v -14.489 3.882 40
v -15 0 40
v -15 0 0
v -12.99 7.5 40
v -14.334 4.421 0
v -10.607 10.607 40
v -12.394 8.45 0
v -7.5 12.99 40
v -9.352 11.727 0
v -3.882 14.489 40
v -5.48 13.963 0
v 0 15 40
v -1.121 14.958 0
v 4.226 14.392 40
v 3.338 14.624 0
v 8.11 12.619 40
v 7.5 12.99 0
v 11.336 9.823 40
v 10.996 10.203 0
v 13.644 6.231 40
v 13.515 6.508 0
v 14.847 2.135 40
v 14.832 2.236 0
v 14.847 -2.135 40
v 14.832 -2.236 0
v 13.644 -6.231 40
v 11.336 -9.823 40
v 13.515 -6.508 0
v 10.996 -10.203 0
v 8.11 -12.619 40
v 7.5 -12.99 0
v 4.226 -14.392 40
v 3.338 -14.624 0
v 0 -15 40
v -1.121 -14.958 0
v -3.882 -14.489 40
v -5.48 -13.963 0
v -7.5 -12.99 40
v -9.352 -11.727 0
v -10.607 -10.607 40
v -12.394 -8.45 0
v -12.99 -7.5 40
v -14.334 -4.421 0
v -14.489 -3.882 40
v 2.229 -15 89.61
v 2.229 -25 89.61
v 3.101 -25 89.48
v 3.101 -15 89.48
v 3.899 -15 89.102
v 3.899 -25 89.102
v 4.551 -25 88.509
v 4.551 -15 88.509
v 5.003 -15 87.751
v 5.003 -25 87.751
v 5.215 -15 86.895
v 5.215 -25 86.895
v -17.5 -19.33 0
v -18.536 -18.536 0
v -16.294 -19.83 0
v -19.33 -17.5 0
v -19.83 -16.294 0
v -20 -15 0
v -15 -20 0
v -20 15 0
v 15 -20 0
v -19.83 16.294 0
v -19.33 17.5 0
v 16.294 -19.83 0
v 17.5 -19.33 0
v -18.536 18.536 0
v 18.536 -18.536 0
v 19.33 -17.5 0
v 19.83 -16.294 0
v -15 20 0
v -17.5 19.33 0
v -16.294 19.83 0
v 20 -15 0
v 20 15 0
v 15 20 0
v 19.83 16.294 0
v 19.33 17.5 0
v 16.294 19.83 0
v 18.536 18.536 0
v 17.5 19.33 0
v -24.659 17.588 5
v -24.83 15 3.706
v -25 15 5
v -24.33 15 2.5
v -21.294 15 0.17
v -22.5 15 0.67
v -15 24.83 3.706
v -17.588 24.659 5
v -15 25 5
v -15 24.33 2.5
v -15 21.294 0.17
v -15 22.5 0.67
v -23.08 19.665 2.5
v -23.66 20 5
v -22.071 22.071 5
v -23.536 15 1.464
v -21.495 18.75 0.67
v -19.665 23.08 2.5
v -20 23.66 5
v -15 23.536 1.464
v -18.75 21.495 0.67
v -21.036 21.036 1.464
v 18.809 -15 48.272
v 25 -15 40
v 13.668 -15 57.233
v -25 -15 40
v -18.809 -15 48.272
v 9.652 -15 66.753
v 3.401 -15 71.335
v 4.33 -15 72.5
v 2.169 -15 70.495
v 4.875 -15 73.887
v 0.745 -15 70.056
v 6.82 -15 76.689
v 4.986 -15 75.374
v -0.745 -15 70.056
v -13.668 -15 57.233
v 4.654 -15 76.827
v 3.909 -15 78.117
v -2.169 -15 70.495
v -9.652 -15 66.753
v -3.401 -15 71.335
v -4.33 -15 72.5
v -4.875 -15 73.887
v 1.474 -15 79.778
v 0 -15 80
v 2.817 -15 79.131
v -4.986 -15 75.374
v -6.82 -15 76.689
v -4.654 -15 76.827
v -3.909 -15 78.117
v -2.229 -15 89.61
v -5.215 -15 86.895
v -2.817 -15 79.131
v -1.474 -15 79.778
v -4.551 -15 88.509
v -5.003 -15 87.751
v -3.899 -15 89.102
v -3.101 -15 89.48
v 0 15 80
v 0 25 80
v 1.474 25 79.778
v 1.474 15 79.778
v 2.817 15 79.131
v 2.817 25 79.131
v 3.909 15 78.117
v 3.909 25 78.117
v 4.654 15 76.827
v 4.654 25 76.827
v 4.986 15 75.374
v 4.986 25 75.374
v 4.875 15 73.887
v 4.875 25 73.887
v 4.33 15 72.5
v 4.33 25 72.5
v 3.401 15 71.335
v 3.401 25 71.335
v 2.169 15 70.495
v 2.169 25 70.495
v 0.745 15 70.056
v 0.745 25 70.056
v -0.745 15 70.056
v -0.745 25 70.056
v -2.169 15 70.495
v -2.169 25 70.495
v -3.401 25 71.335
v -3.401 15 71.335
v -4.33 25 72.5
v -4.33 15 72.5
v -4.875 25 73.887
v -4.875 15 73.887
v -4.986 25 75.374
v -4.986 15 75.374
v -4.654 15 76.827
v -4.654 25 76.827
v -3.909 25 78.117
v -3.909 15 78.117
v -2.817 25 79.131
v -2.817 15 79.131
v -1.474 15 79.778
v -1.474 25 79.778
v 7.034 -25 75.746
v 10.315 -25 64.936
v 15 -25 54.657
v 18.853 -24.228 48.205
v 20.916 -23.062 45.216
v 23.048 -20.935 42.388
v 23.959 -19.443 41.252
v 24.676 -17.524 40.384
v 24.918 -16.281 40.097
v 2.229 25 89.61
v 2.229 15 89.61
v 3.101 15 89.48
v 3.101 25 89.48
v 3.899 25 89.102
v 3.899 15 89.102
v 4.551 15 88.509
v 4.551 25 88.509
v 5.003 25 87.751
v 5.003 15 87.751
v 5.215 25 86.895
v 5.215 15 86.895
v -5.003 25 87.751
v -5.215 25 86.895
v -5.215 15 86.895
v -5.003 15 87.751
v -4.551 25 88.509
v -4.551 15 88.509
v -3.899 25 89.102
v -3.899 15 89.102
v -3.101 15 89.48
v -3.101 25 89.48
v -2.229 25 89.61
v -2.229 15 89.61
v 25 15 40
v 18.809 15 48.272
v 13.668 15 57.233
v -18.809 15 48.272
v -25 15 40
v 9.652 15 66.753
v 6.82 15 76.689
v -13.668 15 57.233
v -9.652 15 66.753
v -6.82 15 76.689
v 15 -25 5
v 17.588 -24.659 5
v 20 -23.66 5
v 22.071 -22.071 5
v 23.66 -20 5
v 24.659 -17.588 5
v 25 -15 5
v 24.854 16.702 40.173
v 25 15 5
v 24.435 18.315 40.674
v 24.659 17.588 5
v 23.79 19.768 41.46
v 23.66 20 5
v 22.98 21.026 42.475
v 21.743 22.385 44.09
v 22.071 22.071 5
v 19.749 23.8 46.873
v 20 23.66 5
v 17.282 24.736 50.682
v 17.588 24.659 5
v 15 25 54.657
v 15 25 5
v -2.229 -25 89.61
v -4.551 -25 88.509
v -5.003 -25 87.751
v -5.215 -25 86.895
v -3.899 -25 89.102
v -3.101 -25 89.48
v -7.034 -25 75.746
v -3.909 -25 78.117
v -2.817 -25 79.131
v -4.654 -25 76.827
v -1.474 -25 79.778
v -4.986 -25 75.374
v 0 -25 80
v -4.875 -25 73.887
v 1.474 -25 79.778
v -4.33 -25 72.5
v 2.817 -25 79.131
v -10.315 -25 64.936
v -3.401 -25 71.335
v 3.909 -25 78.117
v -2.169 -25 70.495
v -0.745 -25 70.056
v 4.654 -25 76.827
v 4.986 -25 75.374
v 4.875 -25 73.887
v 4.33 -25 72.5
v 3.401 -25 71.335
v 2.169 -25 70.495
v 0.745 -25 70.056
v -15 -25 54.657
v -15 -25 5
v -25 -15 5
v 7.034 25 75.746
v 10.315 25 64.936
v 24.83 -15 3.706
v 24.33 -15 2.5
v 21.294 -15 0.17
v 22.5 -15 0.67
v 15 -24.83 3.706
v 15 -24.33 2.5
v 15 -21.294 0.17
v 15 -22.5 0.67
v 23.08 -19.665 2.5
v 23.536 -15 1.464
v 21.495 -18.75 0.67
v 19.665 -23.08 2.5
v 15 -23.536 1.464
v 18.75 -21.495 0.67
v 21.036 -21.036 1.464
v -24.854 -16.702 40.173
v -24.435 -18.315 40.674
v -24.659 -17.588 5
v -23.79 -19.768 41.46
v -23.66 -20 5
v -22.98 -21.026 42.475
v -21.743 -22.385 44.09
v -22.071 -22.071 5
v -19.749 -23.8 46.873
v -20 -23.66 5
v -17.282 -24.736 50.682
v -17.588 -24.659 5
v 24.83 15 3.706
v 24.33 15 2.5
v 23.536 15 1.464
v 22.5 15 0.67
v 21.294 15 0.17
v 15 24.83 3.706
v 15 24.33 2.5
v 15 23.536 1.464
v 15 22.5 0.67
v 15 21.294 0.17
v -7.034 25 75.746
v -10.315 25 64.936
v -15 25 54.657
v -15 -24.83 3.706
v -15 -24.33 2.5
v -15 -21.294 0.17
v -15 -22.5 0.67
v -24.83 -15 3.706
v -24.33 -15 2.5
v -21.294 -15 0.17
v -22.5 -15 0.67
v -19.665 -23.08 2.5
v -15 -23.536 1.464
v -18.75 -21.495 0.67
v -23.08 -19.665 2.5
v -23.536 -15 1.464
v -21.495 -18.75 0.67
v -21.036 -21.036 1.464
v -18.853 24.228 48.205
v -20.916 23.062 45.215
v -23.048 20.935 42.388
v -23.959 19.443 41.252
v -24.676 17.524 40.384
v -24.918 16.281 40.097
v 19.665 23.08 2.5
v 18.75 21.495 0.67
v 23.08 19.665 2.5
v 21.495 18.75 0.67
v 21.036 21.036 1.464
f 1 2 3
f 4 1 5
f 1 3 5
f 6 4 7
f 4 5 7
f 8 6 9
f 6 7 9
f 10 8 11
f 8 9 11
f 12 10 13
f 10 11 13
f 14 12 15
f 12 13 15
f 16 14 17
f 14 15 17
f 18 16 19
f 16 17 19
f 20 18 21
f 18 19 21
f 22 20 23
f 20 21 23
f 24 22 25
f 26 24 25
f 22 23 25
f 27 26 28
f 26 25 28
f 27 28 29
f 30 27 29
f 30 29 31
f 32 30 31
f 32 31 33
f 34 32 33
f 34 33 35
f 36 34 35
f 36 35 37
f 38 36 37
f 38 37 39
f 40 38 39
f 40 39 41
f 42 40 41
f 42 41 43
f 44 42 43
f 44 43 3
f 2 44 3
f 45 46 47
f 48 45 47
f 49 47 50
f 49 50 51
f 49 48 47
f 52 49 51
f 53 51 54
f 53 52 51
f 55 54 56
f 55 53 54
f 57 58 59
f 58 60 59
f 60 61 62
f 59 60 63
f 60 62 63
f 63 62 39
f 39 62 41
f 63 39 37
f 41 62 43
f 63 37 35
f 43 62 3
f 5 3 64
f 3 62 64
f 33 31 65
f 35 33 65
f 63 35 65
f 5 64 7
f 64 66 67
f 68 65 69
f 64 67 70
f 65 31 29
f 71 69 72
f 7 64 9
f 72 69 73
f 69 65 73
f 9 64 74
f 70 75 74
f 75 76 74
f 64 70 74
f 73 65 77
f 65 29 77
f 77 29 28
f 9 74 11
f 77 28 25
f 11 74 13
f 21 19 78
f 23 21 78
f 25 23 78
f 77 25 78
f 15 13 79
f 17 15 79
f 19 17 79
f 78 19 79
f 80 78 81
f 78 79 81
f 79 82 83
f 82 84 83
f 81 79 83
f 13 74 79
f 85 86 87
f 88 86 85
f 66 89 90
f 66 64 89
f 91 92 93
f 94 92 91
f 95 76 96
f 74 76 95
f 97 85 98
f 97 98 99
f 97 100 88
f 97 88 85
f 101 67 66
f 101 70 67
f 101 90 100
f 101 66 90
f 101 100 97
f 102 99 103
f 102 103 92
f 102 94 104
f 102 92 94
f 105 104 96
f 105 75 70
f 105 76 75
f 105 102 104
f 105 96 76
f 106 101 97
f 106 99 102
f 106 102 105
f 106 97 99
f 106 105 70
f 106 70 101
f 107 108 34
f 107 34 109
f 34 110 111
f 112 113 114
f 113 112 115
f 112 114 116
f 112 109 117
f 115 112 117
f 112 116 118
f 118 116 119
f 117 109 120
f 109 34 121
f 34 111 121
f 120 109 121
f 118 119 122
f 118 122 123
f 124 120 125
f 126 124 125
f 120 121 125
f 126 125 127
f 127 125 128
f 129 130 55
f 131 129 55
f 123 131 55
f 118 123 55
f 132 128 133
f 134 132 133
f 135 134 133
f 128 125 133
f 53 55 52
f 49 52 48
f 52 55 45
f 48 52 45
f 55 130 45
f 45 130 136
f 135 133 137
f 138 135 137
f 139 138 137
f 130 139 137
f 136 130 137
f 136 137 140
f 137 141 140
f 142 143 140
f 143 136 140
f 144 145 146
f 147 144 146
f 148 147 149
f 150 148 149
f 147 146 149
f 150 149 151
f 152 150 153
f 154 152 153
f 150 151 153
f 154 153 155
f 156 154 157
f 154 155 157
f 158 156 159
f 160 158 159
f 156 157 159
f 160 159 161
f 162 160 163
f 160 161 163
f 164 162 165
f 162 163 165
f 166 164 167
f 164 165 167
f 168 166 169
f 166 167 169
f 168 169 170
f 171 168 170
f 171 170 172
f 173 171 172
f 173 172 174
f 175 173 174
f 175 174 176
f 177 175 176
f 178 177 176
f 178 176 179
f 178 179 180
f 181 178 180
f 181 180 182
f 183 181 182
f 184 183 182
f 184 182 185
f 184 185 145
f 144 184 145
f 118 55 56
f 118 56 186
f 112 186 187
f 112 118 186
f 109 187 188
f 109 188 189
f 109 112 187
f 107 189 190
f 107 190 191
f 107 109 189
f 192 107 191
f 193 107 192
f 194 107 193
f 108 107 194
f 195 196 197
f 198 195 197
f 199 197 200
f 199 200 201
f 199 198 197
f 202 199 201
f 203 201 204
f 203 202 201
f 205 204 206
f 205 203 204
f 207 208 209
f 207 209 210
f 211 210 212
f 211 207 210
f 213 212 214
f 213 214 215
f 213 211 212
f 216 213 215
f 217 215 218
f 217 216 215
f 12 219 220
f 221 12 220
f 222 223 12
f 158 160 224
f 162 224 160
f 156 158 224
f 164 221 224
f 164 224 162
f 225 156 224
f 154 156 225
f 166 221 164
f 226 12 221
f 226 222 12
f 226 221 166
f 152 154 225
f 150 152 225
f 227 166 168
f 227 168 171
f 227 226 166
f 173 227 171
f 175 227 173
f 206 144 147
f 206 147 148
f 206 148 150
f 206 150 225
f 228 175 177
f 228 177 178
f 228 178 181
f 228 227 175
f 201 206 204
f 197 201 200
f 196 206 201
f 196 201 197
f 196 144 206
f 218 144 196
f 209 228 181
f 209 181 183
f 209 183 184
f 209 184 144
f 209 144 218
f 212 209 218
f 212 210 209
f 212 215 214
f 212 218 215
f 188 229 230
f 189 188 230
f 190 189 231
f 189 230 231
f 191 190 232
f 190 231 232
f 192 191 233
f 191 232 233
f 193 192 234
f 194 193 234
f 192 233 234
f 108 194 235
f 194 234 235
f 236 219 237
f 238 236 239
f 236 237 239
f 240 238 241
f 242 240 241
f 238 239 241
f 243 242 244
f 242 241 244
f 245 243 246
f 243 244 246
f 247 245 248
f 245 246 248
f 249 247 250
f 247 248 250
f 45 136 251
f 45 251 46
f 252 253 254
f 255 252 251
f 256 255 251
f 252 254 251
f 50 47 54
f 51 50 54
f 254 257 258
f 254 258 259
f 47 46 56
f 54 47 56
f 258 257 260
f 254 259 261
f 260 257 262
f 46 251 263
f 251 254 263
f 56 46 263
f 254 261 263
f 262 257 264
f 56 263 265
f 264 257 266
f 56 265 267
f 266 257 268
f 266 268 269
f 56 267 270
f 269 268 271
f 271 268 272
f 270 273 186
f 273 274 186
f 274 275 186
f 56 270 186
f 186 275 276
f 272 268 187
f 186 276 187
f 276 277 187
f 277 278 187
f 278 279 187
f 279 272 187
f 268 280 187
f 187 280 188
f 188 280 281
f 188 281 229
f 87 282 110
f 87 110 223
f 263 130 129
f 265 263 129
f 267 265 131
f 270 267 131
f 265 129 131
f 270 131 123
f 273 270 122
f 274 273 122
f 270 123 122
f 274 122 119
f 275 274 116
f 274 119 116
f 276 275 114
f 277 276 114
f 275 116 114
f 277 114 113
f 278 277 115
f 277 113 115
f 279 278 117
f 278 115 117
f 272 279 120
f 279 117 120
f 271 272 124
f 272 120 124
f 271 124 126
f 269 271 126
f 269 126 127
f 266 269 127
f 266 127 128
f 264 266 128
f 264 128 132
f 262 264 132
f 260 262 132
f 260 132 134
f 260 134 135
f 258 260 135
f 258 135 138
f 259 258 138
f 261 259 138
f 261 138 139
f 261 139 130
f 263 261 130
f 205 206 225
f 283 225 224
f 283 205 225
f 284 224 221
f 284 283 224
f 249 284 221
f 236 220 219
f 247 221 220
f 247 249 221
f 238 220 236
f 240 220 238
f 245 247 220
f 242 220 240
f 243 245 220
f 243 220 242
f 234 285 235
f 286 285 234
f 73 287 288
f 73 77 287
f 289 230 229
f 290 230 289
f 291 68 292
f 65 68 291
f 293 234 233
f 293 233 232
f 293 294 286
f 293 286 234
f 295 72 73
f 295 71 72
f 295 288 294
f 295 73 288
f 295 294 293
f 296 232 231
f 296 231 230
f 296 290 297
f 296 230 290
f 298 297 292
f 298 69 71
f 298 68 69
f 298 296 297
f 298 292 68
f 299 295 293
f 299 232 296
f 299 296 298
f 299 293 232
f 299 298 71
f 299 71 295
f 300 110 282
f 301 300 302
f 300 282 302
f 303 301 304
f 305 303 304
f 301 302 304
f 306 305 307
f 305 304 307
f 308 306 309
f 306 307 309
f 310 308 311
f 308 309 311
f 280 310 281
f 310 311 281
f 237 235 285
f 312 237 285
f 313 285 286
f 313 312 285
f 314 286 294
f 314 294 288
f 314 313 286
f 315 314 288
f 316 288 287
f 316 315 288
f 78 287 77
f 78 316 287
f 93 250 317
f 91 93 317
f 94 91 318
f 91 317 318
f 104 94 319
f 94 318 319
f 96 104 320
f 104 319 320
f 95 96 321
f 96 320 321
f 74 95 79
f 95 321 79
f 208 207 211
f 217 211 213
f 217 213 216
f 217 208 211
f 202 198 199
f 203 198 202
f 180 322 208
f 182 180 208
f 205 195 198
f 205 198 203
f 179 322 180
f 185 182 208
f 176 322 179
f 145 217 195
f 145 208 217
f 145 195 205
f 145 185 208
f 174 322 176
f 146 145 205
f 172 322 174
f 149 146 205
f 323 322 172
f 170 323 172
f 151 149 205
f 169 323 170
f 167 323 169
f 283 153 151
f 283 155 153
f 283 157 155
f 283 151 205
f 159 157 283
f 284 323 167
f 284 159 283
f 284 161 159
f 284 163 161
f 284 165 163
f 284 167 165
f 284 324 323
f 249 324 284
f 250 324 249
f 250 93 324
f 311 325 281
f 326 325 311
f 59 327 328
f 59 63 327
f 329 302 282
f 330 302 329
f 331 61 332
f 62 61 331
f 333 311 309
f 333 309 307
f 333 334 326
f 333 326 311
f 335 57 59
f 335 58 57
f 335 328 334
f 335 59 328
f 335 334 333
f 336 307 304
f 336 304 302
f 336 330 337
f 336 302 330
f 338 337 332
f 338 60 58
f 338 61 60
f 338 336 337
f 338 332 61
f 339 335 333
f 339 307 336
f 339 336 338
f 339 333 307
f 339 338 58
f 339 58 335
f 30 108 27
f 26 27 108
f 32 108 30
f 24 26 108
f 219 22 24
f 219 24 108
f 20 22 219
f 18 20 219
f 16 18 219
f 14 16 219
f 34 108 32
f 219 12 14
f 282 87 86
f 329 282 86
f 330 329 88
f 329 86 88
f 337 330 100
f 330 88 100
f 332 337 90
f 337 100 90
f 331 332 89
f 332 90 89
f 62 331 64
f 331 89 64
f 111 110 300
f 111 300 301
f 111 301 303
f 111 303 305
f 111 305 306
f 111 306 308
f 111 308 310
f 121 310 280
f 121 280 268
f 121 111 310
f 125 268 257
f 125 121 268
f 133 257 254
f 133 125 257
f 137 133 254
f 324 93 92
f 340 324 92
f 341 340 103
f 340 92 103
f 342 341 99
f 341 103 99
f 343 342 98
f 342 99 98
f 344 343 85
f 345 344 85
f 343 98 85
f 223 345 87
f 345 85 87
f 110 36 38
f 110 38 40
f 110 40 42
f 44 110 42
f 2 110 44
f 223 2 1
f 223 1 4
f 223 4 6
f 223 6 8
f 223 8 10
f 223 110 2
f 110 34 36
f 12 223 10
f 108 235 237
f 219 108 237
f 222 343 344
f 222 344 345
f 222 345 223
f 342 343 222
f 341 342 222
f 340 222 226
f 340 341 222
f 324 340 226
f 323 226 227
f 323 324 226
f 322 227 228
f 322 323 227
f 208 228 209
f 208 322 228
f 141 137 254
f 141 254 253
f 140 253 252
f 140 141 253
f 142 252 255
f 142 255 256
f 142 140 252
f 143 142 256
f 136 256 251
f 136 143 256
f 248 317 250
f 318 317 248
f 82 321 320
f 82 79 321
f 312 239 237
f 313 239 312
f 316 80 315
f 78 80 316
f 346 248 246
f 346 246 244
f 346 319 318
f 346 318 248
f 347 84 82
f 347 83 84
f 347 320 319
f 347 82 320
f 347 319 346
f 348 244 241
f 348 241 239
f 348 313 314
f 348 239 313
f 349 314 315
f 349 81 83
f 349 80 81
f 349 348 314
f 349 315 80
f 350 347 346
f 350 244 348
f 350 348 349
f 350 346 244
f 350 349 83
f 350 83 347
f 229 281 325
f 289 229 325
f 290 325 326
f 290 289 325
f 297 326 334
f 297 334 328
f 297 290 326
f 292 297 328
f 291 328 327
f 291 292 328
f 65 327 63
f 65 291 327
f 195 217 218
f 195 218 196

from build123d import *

# Parameters (mm, degrees)
SKETCH1_W           = 50
SKETCH1_H           = 50
BOSS_EXTRUDE1_DEPTH = 89.61
SKETCH2_R           = 15
CUT_EXTRUDE1_DEPTH  = 97.332508013
SKETCH3_W           = 49.61
SKETCH3_H           = 30
CUT_EXTRUDE2_DEPTH  = 106.61700668
FILLET3_R           = 5
FILLET4_R           = 10
SKETCH4_R           = 5
CUT_EXTRUDE3_DEPTH  = 106.61700668


with BuildPart() as part:
    # Sketch1 → Boss-Extrude1 (new body)
    with BuildSketch(Plane.XY):
        Rectangle(SKETCH1_W, SKETCH1_H)
    extrude(amount=BOSS_EXTRUDE1_DEPTH)

    # Sketch2 → Cut-Extrude1 (cut, through all)
    with BuildSketch(Plane(origin=(0, 0, 0), x_dir=(-1, 0, 0), z_dir=(0, 0, -1))):
        Circle(SKETCH2_R)
    extrude(amount=-CUT_EXTRUDE1_DEPTH, mode=Mode.SUBTRACT)

    # Sketch3 → Cut-Extrude2 (cut, through all)
    with BuildSketch(Plane.ZY.offset(25)):
        with Locations((64.805, 0)):
            Rectangle(SKETCH3_W, SKETCH3_H)
    extrude(amount=-CUT_EXTRUDE2_DEPTH, mode=Mode.SUBTRACT)

    # Fillet3
    fillet3_edges = [part.edges().sort_by_distance(p)[0] for p in [
        (0, -25, 0),
        (-25, 0, 0),
        (0, 25, 0),
        (25, 0, 0),
    ]]
    fillet(fillet3_edges, radius=FILLET3_R)

    # Fillet4
    # the kernel refuses this fillet: 10 mm, written as the material it takes off along each edge
    with BuildSketch(Plane(origin=(-15, -15, 0), x_dir=(0, -1, 0), z_dir=(1, 0, 0))) as fillet4_piece_1:
        with BuildLine():
            CenterArc((5, -5), 5, 0, 90)
            Line((10, -5), (10, 0))
            Line((10, 0), (5, 0))
        make_face()
    revolve(axis=Axis((-15, -15, 0), (0, 0, -1)), revolution_arc=90, mode=Mode.SUBTRACT)
    with BuildSketch(Plane(origin=(15, -15, 0), x_dir=(1, 0, 0), z_dir=(0, 1, 0))) as fillet4_piece_2:
        with BuildLine():
            CenterArc((5, -5), 5, 0, 90)
            Line((10, -5), (10, 0))
            Line((10, 0), (5, 0))
        make_face()
    revolve(axis=Axis((15, -15, 0), (0, 0, -1)), revolution_arc=90, mode=Mode.SUBTRACT)
    with BuildSketch(Plane(origin=(15, 15, 0), x_dir=(0, 1, 0), z_dir=(-1, 0, 0))) as fillet4_piece_3:
        with BuildLine():
            CenterArc((5, -5), 5, 0, 90)
            Line((10, -5), (10, 0))
            Line((10, 0), (5, 0))
        make_face()
    revolve(axis=Axis((15, 15, 0), (0, 0, -1)), revolution_arc=90, mode=Mode.SUBTRACT)
    with BuildSketch(Plane(origin=(-15, 15, 0), x_dir=(-1, 0, 0), z_dir=(0, -1, 0))) as fillet4_piece_4:
        with BuildLine():
            CenterArc((5, -5), 5, 0, 90)
            Line((10, -5), (10, 0))
            Line((10, 0), (5, 0))
        make_face()
    revolve(axis=Axis((-15, 15, 0), (0, 0, -1)), revolution_arc=90, mode=Mode.SUBTRACT)
    with BuildSketch(Plane(origin=(-25, 25, 0), x_dir=(1, 0, 0), z_dir=(0, 0, 1)), Plane(origin=(-25, -25, 0), x_dir=(0, 1, 0), z_dir=(0, 0, 1))) as fillet4_piece_5:
        with BuildLine():
            CenterArc((FILLET4_R, -FILLET4_R), FILLET4_R, 90, 90)
            Line((0, -FILLET4_R), (0, 0))
            Line((0, 0), (FILLET4_R, 0))
        make_face()
    extrude(amount=114.61, mode=Mode.SUBTRACT)
    with BuildSketch(Plane(origin=(25, 25, 0), x_dir=(-1, 0, 0), z_dir=(0, 0, 1)), Plane(origin=(25, -25, 0), x_dir=(0, 1, 0), z_dir=(0, 0, 1))) as fillet4_piece_6:
        with BuildLine():
            CenterArc((FILLET4_R, FILLET4_R), FILLET4_R, 180, 90)
            Line((0, FILLET4_R), (0, 0))
            Line((0, 0), (FILLET4_R, 0))
        make_face()
    extrude(amount=114.61, mode=Mode.SUBTRACT)

    # Sketch4 → Cut-Extrude3 (cut, through all)
    with BuildSketch(Plane(origin=(0, 25, 0), x_dir=(1, 0, 0), z_dir=(0, 1, 0))):
        with Locations(Location((0, -75, 0), (0, 0, 270))):
            Circle(SKETCH4_R)
        with BuildLine():
            Line((-2.228917094, -89.61), (2.228917094, -89.61))
            ThreePointArc((2.228917094, -89.61), (4.246928068, -88.829826954), (5.21534053, -86.895087804))
            ThreePointArc((5.21534053, -86.895087804), (11.515192631, -61.931906551), (25, -40))
            add(Edge.make_bspline(
                [(-25, -40), (-88.150639052, -71.432998628), (-33.241224171, -142.040624048), (62.119232947, -121.01307169), (53.993290676, -50.260593277), (25, -40)],
                knots=[0, 0, 0, 0, 0.488610216, 0.657386139, 1, 1, 1, 1], degree=3))
            ThreePointArc((-25, -40), (-11.515192631, -61.931906551), (-5.21534053, -86.895087804))
            ThreePointArc((-5.21534053, -86.895087804), (-4.246928068, -88.829826954), (-2.228917094, -89.61))
        make_face()
    extrude(amount=-CUT_EXTRUDE3_DEPTH, mode=Mode.SUBTRACT)


solid = part.part
